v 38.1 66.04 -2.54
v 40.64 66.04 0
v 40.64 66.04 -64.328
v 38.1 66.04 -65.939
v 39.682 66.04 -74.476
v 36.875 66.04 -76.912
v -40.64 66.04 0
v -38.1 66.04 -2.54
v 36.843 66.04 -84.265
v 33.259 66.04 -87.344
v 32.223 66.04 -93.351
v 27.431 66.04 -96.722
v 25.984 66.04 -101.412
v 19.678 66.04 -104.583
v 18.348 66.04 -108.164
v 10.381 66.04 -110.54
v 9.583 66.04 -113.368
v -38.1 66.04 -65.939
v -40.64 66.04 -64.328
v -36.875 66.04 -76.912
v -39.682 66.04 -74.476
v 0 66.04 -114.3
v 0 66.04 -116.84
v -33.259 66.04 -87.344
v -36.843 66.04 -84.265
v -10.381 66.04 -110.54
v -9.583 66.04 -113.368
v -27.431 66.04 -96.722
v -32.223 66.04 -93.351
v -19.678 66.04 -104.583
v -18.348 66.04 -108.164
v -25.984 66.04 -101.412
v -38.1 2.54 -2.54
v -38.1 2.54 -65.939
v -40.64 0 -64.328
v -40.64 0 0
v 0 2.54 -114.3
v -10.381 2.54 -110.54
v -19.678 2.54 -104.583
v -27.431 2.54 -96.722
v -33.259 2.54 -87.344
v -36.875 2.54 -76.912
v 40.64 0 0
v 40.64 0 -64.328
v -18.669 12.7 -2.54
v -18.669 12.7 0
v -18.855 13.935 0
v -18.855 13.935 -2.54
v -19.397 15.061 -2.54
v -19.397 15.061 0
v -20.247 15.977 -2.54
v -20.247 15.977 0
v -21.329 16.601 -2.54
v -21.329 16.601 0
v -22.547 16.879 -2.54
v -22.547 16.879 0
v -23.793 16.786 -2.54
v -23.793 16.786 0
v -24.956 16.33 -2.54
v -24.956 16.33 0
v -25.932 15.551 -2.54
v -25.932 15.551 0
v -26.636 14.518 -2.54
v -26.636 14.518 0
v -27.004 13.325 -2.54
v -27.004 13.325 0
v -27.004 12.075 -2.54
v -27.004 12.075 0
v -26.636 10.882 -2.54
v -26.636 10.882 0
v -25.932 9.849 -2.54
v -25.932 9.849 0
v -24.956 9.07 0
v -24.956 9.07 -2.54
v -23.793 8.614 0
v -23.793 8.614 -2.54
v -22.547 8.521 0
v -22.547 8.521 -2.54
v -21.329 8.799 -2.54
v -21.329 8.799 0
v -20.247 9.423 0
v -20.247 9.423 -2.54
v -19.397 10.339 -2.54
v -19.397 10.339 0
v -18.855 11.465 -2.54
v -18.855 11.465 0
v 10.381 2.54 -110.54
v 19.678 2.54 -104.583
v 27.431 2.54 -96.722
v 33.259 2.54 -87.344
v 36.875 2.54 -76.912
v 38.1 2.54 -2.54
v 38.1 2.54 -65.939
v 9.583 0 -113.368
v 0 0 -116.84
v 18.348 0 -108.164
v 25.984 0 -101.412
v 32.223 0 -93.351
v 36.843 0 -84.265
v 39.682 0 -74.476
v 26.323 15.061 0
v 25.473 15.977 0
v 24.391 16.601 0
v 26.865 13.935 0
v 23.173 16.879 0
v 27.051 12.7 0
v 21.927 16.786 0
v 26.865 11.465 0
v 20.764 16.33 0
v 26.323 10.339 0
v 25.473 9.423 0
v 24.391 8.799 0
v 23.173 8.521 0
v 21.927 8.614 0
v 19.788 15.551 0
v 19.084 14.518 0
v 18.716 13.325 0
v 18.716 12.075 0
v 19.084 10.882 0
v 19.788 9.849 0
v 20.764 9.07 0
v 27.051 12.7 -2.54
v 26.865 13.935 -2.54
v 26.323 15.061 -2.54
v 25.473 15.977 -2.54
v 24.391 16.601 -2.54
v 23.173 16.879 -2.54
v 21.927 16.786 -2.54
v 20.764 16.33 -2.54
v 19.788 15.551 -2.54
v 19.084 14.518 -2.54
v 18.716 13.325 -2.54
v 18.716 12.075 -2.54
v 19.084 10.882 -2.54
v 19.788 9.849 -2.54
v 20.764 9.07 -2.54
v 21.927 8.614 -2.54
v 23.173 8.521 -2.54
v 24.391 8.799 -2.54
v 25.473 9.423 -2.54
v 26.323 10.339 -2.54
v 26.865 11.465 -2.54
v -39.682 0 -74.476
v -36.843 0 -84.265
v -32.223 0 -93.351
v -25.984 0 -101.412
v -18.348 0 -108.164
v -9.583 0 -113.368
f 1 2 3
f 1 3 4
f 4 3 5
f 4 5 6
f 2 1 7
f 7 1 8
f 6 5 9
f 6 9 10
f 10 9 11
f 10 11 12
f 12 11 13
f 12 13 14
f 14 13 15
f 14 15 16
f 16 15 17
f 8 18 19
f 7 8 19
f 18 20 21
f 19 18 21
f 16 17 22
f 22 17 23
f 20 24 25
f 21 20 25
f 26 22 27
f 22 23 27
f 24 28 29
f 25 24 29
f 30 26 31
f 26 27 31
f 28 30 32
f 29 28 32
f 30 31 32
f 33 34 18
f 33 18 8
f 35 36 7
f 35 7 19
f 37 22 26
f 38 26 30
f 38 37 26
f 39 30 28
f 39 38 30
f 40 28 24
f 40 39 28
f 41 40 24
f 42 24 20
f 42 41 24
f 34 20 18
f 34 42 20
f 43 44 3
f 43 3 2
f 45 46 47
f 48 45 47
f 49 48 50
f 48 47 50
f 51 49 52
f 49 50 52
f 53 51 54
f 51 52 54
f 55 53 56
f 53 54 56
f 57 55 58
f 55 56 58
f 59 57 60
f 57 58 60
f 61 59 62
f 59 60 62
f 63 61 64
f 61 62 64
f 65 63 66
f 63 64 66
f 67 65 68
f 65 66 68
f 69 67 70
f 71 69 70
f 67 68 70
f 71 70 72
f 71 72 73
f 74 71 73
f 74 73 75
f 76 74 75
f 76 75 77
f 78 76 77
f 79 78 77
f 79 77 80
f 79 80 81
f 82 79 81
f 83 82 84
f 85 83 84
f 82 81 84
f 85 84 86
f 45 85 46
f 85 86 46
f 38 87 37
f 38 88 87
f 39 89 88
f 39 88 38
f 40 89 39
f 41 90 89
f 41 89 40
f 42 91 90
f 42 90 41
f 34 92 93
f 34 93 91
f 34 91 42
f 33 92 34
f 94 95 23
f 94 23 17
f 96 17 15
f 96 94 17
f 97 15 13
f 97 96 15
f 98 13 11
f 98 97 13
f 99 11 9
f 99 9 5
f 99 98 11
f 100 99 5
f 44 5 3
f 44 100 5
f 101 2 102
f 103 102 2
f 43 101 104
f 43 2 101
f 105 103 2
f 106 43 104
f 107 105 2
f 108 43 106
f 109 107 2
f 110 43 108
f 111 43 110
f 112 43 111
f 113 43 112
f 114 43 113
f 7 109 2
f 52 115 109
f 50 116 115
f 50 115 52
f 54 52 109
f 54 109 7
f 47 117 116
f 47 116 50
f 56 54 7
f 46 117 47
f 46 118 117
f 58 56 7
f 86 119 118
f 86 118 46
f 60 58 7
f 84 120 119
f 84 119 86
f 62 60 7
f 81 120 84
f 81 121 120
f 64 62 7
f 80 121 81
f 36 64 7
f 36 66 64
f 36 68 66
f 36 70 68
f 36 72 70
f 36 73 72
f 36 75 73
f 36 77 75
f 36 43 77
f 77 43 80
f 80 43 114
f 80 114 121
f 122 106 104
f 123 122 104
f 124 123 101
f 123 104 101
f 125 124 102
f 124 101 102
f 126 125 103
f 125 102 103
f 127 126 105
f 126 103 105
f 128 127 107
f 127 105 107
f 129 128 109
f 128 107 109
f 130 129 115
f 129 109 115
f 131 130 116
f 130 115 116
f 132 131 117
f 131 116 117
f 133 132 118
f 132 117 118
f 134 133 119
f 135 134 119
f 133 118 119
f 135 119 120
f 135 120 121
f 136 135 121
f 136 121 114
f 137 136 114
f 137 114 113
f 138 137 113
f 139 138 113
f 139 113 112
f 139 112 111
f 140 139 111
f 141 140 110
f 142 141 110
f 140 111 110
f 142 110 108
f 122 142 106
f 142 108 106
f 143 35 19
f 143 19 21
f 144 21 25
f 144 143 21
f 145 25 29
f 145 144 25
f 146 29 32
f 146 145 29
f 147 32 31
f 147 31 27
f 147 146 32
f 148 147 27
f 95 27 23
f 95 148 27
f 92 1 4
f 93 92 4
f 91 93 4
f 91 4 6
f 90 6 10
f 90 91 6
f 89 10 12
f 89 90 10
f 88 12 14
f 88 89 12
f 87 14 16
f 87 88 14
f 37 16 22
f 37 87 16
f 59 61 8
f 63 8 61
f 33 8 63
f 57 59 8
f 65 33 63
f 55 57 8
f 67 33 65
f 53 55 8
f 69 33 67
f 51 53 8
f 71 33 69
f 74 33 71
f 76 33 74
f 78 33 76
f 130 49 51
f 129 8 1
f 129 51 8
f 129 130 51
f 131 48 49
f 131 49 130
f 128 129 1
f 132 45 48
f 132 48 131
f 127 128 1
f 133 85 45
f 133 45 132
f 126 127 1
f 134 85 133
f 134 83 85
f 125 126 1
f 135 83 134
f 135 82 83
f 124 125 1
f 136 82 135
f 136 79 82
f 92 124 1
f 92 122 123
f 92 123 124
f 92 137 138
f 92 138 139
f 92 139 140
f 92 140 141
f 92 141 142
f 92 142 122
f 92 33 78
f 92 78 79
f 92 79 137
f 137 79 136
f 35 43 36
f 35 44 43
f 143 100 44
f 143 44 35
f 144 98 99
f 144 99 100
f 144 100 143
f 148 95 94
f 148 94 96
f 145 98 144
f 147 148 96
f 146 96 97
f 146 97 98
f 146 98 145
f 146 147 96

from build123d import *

# Parameters (mm, degrees)
BOSS_EXTRUDE1_DEPTH = 66.04
THICKEN1_T2         = 2.54
SKETCH3_R           = 4.191
CUT_EXTRUDE1_DEPTH  = 2.54


with BuildPart() as part:
    # Sketch1 → Boss-Extrude1 (new body)
    with BuildSketch(Plane(origin=(0, 0, 0), x_dir=(1, 0, 0), z_dir=(0, 1, 0))):
        with BuildLine():
            Line((40.64, 0), (-40.64, 0))
            Line((-40.64, 0), (-40.64, 64.32775415))
            ThreePointArc((-40.64, 64.32775415), (-29.293308759, 97.528452803), (0, 116.84))
            ThreePointArc((0, 116.84), (29.293308759, 97.528452803), (40.64, 64.32775415))
            Line((40.64, 64.32775415), (40.64, 0))
        make_face()
        with BuildLine():
            Line((-38.1, 2.54), (38.1, 2.54))
            Line((38.1, 2.54), (38.1, 65.938950101))
            ThreePointArc((38.1, 65.938950101), (27.430794734, 96.722067013), (0, 114.3))
            ThreePointArc((0, 114.3), (-27.430794734, 96.722067013), (-38.1, 65.938950101))
            Line((-38.1, 65.938950101), (-38.1, 2.54))
        make_face(mode=Mode.SUBTRACT)
    extrude(amount=BOSS_EXTRUDE1_DEPTH)

    # Sketch2 → Surface-Plane1: a flat surface bounded by the sketch
    with BuildSketch(Plane.XZ, mode=Mode.PRIVATE) as surface_plane1_1_region:
        with BuildLine():
            Line((-40.64, 0), (40.64, 0))
            Line((40.64, 0), (40.64, -64.32775415))
            ThreePointArc((40.64, -64.32775415), (29.293308759, -97.528452803), (0, -116.84))
            ThreePointArc((0, -116.84), (-29.293308759, -97.528452803), (-40.64, -64.32775415))
            Line((-40.64, -64.32775415), (-40.64, 0))
        make_face()
    surface_plane1_1 = surface_plane1_1_region.sketch.faces()[0]
    add(Solid.thicken(surface_plane1_1, -THICKEN1_T2))

    # Sketch3 → Cut-Extrude1 (cut)
    with BuildSketch(Plane.XY):
        with Locations((22.86, 12.7)):
            Circle(SKETCH3_R)
        with Locations((-22.86, 12.7)):
            Circle(SKETCH3_R)
    extrude(amount=-CUT_EXTRUDE1_DEPTH, mode=Mode.SUBTRACT)


solid = part.part
